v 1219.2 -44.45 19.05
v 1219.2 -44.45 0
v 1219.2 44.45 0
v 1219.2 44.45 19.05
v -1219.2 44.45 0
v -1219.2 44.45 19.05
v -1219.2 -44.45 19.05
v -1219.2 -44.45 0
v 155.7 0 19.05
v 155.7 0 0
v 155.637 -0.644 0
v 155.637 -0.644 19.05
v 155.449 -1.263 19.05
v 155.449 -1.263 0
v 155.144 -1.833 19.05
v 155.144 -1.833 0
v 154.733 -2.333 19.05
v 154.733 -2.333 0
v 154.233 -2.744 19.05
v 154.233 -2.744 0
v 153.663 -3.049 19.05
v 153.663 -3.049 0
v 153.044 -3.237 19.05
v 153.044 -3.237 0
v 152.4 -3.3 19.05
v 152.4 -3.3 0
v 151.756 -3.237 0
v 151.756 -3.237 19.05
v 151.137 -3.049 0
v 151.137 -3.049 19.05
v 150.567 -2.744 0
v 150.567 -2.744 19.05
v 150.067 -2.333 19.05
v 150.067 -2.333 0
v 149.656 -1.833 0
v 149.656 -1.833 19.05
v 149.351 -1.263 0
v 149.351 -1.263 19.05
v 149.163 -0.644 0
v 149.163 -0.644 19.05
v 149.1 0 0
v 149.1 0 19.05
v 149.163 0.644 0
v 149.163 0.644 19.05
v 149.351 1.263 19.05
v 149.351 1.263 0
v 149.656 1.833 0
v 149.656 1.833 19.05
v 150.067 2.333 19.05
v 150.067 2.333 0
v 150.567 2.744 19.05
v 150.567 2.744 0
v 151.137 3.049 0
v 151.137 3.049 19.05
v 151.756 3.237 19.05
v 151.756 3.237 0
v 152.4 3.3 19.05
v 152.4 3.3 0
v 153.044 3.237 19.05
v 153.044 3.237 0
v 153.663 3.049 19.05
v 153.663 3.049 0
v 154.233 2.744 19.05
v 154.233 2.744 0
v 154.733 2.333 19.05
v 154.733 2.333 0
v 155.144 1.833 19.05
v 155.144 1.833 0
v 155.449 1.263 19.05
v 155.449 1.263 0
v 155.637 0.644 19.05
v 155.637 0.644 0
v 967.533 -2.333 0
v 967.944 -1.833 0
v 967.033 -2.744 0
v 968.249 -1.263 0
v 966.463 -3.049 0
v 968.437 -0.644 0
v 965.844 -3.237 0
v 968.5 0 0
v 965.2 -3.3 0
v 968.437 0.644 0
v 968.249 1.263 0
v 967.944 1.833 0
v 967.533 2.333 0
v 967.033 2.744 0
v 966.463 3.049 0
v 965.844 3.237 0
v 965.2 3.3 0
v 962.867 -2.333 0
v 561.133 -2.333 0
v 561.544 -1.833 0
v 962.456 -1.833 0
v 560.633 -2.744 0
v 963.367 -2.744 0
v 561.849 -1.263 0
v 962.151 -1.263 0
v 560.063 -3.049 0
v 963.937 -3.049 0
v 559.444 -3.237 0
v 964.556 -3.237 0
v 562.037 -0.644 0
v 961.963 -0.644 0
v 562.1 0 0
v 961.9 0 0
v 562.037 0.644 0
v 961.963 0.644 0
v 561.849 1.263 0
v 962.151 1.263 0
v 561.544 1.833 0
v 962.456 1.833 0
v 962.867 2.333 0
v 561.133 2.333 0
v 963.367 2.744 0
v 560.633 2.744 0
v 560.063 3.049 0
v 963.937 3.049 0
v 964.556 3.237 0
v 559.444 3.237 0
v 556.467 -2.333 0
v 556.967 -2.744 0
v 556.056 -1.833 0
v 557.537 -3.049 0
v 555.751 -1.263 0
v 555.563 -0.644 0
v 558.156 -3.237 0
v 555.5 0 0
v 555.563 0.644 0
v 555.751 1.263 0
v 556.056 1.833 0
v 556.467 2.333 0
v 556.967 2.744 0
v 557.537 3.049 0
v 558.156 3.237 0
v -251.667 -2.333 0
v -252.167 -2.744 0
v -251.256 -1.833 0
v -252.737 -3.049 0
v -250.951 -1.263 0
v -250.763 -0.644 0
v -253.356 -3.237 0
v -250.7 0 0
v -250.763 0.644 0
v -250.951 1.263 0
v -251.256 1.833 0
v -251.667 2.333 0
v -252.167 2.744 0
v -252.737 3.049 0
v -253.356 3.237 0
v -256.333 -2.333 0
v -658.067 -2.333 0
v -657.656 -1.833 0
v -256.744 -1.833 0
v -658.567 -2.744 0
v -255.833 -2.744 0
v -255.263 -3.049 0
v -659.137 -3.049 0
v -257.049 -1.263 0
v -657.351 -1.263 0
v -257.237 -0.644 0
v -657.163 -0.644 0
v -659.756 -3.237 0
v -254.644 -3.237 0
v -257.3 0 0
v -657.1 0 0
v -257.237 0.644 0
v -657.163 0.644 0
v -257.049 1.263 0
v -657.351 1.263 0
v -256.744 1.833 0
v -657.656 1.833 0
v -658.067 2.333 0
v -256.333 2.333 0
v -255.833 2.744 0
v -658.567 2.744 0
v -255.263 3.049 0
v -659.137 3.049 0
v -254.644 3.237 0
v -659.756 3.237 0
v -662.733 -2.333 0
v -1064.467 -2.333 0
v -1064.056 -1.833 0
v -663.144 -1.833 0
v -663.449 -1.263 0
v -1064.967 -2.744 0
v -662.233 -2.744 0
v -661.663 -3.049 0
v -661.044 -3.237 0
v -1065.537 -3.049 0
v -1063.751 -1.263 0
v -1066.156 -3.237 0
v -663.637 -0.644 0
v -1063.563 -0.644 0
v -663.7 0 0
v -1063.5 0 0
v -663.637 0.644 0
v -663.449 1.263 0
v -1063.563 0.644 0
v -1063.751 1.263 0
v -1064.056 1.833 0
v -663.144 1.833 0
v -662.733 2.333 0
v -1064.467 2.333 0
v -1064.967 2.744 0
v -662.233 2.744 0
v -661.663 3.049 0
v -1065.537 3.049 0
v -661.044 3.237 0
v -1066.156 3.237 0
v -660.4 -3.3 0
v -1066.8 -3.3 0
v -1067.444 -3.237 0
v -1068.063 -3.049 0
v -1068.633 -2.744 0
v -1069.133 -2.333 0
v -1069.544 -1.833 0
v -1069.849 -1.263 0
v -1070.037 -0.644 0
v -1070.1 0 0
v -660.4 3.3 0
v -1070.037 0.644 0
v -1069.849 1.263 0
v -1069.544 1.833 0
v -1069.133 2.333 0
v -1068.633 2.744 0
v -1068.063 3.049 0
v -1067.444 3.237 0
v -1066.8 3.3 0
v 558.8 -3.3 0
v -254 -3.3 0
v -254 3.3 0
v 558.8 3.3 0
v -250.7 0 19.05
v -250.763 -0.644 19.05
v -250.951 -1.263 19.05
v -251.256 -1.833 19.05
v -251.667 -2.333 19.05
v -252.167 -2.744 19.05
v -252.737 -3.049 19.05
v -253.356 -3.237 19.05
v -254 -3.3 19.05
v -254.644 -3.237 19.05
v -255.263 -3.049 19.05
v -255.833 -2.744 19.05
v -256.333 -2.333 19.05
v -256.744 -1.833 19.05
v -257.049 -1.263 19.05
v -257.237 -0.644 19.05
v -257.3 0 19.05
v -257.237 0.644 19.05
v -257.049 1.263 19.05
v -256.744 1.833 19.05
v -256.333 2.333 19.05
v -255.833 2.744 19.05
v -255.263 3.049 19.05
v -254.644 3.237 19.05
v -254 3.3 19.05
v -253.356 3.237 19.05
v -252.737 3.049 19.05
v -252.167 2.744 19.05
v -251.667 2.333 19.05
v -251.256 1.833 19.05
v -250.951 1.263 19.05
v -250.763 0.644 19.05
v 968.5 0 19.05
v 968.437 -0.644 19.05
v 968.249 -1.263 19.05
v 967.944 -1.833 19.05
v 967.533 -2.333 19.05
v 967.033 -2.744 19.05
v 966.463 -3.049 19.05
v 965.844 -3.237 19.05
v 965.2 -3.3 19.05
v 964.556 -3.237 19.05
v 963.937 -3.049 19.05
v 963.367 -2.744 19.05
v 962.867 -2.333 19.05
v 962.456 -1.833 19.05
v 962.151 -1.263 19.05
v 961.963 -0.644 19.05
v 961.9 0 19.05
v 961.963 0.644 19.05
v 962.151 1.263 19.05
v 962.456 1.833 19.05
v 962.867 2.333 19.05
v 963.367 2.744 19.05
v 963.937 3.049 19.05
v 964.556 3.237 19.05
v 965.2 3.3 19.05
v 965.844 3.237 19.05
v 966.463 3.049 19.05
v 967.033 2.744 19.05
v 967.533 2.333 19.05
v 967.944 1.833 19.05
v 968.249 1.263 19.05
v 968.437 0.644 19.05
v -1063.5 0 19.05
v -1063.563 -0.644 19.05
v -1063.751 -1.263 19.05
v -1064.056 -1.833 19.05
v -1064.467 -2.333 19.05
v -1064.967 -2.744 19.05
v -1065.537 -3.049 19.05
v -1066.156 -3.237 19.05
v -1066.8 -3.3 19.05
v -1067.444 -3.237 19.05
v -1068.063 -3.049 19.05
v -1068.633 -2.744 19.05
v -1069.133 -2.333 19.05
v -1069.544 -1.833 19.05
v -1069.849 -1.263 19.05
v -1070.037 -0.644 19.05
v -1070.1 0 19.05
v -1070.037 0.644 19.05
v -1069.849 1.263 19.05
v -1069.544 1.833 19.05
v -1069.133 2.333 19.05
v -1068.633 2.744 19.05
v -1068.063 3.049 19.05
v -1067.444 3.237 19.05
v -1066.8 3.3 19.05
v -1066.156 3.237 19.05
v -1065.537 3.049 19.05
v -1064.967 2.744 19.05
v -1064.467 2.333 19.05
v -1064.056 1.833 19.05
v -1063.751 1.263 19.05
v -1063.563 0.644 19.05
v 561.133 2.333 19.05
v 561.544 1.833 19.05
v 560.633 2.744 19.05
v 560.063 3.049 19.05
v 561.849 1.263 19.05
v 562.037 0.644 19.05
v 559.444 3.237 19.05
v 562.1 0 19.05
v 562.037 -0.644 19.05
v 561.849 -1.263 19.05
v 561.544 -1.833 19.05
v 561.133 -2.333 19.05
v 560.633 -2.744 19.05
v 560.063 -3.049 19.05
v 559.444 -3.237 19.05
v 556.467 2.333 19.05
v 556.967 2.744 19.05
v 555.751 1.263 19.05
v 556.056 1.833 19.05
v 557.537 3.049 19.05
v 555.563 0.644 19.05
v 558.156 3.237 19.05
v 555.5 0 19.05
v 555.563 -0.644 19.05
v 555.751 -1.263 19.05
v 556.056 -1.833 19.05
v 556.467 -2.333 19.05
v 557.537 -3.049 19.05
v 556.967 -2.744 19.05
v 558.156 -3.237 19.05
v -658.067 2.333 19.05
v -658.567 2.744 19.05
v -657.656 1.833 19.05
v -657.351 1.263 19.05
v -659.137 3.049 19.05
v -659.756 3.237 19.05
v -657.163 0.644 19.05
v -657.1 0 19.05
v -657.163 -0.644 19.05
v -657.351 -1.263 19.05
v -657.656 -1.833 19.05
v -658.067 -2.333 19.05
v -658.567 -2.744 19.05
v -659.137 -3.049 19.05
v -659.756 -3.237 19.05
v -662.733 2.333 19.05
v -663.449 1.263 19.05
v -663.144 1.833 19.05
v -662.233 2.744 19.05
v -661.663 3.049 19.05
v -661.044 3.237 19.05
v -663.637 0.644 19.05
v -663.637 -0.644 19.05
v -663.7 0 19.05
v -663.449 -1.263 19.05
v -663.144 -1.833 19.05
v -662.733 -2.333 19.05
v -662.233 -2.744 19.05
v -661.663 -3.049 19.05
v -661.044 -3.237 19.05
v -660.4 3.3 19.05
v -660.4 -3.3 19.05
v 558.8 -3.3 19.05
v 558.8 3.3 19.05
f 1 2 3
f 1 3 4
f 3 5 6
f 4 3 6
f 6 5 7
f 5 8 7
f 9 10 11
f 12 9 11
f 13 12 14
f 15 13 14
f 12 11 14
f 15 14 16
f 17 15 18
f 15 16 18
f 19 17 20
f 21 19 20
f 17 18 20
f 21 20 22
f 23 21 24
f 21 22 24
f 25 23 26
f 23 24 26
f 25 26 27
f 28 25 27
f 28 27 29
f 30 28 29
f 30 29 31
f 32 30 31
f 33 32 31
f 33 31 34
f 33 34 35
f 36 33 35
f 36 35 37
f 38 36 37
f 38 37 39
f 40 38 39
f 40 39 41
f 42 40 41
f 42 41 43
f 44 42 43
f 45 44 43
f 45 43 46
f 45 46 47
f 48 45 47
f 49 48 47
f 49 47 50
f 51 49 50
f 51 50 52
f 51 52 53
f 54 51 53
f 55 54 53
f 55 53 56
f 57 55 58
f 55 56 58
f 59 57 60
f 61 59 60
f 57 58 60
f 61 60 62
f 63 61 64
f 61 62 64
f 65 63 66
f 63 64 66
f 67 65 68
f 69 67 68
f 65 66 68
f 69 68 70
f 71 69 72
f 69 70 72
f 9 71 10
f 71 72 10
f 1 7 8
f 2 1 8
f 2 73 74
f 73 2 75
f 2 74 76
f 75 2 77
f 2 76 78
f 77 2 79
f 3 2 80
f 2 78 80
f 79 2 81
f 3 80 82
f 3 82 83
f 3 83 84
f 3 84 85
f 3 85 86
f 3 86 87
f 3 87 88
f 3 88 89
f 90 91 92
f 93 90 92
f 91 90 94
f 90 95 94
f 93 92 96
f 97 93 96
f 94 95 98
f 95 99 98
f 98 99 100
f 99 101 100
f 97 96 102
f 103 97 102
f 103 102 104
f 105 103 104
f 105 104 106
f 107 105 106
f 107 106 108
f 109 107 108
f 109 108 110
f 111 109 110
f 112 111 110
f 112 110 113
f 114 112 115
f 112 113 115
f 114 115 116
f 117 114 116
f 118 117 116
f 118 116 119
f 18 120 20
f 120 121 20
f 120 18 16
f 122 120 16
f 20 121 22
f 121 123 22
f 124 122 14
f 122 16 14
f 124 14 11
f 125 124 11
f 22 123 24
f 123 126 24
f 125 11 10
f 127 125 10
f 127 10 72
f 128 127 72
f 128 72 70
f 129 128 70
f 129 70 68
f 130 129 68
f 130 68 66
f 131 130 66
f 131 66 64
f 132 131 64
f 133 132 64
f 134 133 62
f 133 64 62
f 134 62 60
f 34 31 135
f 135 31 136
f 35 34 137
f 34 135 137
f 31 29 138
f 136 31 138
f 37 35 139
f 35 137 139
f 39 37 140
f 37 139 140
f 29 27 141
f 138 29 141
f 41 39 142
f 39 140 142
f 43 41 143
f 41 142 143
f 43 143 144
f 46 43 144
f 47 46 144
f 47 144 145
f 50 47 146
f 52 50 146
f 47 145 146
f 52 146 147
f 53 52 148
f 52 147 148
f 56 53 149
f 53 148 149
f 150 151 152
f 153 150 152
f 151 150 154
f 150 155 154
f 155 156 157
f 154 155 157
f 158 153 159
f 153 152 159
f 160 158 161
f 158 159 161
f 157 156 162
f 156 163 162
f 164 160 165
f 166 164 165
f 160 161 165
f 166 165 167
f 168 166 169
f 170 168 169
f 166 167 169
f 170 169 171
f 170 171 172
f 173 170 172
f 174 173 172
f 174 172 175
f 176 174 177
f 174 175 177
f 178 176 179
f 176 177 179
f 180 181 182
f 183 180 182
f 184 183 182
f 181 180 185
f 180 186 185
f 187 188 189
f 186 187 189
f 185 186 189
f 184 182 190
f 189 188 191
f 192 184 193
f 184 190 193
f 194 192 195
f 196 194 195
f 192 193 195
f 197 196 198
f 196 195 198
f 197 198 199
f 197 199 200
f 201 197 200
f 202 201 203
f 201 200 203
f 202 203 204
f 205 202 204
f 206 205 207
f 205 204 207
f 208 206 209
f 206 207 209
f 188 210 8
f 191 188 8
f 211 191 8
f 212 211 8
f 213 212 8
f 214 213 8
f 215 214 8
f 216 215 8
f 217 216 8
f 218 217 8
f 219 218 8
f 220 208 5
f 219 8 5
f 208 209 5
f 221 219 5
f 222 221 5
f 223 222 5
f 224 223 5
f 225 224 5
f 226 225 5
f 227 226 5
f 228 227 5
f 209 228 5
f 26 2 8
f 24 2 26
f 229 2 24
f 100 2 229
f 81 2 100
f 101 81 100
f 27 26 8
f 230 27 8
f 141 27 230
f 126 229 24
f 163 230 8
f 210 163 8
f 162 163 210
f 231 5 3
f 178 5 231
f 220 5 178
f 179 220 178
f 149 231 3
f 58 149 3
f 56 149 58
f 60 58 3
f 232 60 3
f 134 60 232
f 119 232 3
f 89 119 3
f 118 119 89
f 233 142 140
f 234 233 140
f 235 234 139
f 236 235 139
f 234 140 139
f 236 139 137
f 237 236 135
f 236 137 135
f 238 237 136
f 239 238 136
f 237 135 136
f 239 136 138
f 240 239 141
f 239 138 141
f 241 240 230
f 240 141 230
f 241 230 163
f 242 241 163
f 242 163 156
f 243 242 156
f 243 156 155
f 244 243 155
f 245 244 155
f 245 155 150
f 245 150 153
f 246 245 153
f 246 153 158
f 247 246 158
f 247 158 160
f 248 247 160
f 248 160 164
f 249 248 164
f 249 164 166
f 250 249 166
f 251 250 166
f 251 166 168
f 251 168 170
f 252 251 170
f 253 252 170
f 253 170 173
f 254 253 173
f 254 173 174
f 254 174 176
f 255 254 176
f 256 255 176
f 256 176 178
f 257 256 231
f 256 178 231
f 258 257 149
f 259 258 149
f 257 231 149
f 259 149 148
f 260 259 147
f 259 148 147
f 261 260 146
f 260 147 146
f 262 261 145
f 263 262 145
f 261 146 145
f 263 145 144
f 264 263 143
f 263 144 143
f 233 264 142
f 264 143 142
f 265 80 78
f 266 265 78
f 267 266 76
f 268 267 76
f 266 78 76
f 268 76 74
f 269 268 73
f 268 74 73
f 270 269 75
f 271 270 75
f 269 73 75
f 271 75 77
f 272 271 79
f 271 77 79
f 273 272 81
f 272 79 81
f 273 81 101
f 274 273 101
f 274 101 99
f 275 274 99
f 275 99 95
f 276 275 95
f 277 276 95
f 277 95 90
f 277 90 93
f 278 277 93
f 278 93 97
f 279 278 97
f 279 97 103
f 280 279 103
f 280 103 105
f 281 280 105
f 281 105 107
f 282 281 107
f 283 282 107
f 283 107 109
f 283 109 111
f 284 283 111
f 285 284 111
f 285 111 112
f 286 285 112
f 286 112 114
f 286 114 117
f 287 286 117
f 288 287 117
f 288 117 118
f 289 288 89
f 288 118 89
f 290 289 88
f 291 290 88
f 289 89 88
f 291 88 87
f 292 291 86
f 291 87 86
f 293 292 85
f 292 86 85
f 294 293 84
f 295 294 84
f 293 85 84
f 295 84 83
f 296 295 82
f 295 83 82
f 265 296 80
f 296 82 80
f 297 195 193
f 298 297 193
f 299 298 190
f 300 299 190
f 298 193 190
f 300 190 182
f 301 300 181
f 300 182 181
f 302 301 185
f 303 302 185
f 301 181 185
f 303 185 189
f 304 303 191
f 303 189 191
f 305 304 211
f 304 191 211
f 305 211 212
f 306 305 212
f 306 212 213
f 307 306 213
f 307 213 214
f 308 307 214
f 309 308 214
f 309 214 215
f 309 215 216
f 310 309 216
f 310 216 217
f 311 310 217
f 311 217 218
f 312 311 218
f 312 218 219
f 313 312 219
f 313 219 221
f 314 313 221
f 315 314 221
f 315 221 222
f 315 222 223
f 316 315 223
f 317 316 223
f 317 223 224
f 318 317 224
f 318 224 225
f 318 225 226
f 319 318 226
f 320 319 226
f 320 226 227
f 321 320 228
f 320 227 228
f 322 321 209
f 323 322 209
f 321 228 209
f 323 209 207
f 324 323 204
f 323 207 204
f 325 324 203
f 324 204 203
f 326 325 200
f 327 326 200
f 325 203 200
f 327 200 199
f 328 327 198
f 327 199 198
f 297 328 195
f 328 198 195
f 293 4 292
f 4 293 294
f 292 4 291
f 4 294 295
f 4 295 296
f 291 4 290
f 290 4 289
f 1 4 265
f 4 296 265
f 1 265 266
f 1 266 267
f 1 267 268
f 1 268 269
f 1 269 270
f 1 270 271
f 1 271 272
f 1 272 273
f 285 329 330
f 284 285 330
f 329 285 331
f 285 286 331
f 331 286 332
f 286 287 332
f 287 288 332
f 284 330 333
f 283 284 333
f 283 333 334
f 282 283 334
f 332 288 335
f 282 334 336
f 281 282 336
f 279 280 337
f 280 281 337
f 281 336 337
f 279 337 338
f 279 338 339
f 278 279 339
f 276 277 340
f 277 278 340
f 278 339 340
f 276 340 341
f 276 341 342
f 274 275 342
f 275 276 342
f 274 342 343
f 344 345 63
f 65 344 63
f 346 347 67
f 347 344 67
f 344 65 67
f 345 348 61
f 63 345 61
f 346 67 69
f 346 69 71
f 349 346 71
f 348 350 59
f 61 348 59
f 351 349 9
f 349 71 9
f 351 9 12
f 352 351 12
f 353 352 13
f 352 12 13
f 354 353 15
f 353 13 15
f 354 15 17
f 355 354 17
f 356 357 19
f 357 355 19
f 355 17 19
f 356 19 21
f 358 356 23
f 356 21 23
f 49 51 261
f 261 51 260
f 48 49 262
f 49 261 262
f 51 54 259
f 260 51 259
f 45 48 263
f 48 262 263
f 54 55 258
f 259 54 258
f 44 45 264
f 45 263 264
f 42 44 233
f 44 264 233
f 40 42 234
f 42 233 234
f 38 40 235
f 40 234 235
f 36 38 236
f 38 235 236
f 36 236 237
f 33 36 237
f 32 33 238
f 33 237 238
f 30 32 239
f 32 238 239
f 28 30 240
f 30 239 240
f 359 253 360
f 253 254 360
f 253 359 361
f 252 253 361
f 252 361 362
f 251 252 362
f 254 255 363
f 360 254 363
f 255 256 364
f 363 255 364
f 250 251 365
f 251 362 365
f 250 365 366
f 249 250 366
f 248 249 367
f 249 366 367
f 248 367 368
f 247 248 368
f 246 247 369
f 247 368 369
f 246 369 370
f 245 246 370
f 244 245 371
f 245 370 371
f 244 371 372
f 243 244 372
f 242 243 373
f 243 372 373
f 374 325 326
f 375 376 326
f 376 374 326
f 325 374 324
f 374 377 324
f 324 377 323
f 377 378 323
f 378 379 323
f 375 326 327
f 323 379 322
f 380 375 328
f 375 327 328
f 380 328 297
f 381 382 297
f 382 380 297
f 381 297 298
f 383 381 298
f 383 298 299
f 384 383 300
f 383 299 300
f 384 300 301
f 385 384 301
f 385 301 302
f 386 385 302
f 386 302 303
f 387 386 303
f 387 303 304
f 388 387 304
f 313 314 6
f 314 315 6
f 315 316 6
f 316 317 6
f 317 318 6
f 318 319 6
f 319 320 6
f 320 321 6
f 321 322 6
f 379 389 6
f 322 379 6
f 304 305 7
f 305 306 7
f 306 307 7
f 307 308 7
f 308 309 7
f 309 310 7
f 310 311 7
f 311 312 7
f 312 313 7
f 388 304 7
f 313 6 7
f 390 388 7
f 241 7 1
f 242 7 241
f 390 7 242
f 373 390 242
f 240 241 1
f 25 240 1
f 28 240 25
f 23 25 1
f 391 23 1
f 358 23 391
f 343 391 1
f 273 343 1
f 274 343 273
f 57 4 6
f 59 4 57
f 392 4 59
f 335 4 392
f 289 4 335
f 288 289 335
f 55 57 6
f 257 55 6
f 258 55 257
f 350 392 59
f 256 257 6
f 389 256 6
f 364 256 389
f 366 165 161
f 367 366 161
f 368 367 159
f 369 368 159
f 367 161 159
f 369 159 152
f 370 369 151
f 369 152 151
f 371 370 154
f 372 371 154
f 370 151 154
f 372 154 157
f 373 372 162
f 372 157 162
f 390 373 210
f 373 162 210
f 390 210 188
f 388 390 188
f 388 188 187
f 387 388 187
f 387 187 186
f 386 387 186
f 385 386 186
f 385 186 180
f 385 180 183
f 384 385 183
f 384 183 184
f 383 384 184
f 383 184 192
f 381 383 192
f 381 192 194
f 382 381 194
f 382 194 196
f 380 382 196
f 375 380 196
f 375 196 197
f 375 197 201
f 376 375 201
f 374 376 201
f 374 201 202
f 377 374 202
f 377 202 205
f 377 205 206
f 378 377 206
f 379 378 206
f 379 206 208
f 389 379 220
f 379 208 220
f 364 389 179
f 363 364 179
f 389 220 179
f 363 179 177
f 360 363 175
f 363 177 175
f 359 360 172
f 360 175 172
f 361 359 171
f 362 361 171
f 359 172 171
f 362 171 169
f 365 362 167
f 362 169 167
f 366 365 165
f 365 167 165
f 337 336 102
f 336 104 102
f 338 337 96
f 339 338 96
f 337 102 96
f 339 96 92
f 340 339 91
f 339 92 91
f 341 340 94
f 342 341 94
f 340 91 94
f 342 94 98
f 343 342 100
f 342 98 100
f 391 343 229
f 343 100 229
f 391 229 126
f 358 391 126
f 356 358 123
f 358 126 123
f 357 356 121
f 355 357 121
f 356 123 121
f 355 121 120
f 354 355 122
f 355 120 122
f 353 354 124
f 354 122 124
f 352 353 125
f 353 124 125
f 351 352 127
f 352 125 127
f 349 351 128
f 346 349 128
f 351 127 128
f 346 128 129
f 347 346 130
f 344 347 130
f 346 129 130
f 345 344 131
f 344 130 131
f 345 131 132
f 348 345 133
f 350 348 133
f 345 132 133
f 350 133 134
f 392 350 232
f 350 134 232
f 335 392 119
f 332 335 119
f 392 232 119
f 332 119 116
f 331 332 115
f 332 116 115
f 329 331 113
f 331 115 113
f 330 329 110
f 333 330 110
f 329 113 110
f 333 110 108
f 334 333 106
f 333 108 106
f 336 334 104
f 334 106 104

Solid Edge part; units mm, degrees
sketch "Sketch1" plane through (0, 0, 0) normal (1, 0, 0) x (0, 1, 0)
  line L0 (-44.45, 0) -> (44.45, 0)
  line L1 (44.45, 0) -> (44.45, 19.05)
  line L2 (44.45, 19.05) -> (-44.45, 19.05)
  line L3 (-44.45, 19.05) -> (-44.45, 0)
  dimension "D1" = 88.9
  dimension "D2" = 19.05
extrude "Protrusion1" add sketch "Sketch1" along normal mid plane 2438.4
sketch "Sketch2" plane through (0, 0, 0) normal (0, 0, -1) x (1, 0, 0)
  circle A0 centre (-1066.8, 0) radius 3.3
  dimension "D1" = 6.6
  dimension "D2" = 152.4
extrude "Cutout1" cut sketch "Sketch2" against normal through all
pattern_linear "Pattern1" count 6 spacing 406.4 along (1, 0, 0) of "Cutout1"
